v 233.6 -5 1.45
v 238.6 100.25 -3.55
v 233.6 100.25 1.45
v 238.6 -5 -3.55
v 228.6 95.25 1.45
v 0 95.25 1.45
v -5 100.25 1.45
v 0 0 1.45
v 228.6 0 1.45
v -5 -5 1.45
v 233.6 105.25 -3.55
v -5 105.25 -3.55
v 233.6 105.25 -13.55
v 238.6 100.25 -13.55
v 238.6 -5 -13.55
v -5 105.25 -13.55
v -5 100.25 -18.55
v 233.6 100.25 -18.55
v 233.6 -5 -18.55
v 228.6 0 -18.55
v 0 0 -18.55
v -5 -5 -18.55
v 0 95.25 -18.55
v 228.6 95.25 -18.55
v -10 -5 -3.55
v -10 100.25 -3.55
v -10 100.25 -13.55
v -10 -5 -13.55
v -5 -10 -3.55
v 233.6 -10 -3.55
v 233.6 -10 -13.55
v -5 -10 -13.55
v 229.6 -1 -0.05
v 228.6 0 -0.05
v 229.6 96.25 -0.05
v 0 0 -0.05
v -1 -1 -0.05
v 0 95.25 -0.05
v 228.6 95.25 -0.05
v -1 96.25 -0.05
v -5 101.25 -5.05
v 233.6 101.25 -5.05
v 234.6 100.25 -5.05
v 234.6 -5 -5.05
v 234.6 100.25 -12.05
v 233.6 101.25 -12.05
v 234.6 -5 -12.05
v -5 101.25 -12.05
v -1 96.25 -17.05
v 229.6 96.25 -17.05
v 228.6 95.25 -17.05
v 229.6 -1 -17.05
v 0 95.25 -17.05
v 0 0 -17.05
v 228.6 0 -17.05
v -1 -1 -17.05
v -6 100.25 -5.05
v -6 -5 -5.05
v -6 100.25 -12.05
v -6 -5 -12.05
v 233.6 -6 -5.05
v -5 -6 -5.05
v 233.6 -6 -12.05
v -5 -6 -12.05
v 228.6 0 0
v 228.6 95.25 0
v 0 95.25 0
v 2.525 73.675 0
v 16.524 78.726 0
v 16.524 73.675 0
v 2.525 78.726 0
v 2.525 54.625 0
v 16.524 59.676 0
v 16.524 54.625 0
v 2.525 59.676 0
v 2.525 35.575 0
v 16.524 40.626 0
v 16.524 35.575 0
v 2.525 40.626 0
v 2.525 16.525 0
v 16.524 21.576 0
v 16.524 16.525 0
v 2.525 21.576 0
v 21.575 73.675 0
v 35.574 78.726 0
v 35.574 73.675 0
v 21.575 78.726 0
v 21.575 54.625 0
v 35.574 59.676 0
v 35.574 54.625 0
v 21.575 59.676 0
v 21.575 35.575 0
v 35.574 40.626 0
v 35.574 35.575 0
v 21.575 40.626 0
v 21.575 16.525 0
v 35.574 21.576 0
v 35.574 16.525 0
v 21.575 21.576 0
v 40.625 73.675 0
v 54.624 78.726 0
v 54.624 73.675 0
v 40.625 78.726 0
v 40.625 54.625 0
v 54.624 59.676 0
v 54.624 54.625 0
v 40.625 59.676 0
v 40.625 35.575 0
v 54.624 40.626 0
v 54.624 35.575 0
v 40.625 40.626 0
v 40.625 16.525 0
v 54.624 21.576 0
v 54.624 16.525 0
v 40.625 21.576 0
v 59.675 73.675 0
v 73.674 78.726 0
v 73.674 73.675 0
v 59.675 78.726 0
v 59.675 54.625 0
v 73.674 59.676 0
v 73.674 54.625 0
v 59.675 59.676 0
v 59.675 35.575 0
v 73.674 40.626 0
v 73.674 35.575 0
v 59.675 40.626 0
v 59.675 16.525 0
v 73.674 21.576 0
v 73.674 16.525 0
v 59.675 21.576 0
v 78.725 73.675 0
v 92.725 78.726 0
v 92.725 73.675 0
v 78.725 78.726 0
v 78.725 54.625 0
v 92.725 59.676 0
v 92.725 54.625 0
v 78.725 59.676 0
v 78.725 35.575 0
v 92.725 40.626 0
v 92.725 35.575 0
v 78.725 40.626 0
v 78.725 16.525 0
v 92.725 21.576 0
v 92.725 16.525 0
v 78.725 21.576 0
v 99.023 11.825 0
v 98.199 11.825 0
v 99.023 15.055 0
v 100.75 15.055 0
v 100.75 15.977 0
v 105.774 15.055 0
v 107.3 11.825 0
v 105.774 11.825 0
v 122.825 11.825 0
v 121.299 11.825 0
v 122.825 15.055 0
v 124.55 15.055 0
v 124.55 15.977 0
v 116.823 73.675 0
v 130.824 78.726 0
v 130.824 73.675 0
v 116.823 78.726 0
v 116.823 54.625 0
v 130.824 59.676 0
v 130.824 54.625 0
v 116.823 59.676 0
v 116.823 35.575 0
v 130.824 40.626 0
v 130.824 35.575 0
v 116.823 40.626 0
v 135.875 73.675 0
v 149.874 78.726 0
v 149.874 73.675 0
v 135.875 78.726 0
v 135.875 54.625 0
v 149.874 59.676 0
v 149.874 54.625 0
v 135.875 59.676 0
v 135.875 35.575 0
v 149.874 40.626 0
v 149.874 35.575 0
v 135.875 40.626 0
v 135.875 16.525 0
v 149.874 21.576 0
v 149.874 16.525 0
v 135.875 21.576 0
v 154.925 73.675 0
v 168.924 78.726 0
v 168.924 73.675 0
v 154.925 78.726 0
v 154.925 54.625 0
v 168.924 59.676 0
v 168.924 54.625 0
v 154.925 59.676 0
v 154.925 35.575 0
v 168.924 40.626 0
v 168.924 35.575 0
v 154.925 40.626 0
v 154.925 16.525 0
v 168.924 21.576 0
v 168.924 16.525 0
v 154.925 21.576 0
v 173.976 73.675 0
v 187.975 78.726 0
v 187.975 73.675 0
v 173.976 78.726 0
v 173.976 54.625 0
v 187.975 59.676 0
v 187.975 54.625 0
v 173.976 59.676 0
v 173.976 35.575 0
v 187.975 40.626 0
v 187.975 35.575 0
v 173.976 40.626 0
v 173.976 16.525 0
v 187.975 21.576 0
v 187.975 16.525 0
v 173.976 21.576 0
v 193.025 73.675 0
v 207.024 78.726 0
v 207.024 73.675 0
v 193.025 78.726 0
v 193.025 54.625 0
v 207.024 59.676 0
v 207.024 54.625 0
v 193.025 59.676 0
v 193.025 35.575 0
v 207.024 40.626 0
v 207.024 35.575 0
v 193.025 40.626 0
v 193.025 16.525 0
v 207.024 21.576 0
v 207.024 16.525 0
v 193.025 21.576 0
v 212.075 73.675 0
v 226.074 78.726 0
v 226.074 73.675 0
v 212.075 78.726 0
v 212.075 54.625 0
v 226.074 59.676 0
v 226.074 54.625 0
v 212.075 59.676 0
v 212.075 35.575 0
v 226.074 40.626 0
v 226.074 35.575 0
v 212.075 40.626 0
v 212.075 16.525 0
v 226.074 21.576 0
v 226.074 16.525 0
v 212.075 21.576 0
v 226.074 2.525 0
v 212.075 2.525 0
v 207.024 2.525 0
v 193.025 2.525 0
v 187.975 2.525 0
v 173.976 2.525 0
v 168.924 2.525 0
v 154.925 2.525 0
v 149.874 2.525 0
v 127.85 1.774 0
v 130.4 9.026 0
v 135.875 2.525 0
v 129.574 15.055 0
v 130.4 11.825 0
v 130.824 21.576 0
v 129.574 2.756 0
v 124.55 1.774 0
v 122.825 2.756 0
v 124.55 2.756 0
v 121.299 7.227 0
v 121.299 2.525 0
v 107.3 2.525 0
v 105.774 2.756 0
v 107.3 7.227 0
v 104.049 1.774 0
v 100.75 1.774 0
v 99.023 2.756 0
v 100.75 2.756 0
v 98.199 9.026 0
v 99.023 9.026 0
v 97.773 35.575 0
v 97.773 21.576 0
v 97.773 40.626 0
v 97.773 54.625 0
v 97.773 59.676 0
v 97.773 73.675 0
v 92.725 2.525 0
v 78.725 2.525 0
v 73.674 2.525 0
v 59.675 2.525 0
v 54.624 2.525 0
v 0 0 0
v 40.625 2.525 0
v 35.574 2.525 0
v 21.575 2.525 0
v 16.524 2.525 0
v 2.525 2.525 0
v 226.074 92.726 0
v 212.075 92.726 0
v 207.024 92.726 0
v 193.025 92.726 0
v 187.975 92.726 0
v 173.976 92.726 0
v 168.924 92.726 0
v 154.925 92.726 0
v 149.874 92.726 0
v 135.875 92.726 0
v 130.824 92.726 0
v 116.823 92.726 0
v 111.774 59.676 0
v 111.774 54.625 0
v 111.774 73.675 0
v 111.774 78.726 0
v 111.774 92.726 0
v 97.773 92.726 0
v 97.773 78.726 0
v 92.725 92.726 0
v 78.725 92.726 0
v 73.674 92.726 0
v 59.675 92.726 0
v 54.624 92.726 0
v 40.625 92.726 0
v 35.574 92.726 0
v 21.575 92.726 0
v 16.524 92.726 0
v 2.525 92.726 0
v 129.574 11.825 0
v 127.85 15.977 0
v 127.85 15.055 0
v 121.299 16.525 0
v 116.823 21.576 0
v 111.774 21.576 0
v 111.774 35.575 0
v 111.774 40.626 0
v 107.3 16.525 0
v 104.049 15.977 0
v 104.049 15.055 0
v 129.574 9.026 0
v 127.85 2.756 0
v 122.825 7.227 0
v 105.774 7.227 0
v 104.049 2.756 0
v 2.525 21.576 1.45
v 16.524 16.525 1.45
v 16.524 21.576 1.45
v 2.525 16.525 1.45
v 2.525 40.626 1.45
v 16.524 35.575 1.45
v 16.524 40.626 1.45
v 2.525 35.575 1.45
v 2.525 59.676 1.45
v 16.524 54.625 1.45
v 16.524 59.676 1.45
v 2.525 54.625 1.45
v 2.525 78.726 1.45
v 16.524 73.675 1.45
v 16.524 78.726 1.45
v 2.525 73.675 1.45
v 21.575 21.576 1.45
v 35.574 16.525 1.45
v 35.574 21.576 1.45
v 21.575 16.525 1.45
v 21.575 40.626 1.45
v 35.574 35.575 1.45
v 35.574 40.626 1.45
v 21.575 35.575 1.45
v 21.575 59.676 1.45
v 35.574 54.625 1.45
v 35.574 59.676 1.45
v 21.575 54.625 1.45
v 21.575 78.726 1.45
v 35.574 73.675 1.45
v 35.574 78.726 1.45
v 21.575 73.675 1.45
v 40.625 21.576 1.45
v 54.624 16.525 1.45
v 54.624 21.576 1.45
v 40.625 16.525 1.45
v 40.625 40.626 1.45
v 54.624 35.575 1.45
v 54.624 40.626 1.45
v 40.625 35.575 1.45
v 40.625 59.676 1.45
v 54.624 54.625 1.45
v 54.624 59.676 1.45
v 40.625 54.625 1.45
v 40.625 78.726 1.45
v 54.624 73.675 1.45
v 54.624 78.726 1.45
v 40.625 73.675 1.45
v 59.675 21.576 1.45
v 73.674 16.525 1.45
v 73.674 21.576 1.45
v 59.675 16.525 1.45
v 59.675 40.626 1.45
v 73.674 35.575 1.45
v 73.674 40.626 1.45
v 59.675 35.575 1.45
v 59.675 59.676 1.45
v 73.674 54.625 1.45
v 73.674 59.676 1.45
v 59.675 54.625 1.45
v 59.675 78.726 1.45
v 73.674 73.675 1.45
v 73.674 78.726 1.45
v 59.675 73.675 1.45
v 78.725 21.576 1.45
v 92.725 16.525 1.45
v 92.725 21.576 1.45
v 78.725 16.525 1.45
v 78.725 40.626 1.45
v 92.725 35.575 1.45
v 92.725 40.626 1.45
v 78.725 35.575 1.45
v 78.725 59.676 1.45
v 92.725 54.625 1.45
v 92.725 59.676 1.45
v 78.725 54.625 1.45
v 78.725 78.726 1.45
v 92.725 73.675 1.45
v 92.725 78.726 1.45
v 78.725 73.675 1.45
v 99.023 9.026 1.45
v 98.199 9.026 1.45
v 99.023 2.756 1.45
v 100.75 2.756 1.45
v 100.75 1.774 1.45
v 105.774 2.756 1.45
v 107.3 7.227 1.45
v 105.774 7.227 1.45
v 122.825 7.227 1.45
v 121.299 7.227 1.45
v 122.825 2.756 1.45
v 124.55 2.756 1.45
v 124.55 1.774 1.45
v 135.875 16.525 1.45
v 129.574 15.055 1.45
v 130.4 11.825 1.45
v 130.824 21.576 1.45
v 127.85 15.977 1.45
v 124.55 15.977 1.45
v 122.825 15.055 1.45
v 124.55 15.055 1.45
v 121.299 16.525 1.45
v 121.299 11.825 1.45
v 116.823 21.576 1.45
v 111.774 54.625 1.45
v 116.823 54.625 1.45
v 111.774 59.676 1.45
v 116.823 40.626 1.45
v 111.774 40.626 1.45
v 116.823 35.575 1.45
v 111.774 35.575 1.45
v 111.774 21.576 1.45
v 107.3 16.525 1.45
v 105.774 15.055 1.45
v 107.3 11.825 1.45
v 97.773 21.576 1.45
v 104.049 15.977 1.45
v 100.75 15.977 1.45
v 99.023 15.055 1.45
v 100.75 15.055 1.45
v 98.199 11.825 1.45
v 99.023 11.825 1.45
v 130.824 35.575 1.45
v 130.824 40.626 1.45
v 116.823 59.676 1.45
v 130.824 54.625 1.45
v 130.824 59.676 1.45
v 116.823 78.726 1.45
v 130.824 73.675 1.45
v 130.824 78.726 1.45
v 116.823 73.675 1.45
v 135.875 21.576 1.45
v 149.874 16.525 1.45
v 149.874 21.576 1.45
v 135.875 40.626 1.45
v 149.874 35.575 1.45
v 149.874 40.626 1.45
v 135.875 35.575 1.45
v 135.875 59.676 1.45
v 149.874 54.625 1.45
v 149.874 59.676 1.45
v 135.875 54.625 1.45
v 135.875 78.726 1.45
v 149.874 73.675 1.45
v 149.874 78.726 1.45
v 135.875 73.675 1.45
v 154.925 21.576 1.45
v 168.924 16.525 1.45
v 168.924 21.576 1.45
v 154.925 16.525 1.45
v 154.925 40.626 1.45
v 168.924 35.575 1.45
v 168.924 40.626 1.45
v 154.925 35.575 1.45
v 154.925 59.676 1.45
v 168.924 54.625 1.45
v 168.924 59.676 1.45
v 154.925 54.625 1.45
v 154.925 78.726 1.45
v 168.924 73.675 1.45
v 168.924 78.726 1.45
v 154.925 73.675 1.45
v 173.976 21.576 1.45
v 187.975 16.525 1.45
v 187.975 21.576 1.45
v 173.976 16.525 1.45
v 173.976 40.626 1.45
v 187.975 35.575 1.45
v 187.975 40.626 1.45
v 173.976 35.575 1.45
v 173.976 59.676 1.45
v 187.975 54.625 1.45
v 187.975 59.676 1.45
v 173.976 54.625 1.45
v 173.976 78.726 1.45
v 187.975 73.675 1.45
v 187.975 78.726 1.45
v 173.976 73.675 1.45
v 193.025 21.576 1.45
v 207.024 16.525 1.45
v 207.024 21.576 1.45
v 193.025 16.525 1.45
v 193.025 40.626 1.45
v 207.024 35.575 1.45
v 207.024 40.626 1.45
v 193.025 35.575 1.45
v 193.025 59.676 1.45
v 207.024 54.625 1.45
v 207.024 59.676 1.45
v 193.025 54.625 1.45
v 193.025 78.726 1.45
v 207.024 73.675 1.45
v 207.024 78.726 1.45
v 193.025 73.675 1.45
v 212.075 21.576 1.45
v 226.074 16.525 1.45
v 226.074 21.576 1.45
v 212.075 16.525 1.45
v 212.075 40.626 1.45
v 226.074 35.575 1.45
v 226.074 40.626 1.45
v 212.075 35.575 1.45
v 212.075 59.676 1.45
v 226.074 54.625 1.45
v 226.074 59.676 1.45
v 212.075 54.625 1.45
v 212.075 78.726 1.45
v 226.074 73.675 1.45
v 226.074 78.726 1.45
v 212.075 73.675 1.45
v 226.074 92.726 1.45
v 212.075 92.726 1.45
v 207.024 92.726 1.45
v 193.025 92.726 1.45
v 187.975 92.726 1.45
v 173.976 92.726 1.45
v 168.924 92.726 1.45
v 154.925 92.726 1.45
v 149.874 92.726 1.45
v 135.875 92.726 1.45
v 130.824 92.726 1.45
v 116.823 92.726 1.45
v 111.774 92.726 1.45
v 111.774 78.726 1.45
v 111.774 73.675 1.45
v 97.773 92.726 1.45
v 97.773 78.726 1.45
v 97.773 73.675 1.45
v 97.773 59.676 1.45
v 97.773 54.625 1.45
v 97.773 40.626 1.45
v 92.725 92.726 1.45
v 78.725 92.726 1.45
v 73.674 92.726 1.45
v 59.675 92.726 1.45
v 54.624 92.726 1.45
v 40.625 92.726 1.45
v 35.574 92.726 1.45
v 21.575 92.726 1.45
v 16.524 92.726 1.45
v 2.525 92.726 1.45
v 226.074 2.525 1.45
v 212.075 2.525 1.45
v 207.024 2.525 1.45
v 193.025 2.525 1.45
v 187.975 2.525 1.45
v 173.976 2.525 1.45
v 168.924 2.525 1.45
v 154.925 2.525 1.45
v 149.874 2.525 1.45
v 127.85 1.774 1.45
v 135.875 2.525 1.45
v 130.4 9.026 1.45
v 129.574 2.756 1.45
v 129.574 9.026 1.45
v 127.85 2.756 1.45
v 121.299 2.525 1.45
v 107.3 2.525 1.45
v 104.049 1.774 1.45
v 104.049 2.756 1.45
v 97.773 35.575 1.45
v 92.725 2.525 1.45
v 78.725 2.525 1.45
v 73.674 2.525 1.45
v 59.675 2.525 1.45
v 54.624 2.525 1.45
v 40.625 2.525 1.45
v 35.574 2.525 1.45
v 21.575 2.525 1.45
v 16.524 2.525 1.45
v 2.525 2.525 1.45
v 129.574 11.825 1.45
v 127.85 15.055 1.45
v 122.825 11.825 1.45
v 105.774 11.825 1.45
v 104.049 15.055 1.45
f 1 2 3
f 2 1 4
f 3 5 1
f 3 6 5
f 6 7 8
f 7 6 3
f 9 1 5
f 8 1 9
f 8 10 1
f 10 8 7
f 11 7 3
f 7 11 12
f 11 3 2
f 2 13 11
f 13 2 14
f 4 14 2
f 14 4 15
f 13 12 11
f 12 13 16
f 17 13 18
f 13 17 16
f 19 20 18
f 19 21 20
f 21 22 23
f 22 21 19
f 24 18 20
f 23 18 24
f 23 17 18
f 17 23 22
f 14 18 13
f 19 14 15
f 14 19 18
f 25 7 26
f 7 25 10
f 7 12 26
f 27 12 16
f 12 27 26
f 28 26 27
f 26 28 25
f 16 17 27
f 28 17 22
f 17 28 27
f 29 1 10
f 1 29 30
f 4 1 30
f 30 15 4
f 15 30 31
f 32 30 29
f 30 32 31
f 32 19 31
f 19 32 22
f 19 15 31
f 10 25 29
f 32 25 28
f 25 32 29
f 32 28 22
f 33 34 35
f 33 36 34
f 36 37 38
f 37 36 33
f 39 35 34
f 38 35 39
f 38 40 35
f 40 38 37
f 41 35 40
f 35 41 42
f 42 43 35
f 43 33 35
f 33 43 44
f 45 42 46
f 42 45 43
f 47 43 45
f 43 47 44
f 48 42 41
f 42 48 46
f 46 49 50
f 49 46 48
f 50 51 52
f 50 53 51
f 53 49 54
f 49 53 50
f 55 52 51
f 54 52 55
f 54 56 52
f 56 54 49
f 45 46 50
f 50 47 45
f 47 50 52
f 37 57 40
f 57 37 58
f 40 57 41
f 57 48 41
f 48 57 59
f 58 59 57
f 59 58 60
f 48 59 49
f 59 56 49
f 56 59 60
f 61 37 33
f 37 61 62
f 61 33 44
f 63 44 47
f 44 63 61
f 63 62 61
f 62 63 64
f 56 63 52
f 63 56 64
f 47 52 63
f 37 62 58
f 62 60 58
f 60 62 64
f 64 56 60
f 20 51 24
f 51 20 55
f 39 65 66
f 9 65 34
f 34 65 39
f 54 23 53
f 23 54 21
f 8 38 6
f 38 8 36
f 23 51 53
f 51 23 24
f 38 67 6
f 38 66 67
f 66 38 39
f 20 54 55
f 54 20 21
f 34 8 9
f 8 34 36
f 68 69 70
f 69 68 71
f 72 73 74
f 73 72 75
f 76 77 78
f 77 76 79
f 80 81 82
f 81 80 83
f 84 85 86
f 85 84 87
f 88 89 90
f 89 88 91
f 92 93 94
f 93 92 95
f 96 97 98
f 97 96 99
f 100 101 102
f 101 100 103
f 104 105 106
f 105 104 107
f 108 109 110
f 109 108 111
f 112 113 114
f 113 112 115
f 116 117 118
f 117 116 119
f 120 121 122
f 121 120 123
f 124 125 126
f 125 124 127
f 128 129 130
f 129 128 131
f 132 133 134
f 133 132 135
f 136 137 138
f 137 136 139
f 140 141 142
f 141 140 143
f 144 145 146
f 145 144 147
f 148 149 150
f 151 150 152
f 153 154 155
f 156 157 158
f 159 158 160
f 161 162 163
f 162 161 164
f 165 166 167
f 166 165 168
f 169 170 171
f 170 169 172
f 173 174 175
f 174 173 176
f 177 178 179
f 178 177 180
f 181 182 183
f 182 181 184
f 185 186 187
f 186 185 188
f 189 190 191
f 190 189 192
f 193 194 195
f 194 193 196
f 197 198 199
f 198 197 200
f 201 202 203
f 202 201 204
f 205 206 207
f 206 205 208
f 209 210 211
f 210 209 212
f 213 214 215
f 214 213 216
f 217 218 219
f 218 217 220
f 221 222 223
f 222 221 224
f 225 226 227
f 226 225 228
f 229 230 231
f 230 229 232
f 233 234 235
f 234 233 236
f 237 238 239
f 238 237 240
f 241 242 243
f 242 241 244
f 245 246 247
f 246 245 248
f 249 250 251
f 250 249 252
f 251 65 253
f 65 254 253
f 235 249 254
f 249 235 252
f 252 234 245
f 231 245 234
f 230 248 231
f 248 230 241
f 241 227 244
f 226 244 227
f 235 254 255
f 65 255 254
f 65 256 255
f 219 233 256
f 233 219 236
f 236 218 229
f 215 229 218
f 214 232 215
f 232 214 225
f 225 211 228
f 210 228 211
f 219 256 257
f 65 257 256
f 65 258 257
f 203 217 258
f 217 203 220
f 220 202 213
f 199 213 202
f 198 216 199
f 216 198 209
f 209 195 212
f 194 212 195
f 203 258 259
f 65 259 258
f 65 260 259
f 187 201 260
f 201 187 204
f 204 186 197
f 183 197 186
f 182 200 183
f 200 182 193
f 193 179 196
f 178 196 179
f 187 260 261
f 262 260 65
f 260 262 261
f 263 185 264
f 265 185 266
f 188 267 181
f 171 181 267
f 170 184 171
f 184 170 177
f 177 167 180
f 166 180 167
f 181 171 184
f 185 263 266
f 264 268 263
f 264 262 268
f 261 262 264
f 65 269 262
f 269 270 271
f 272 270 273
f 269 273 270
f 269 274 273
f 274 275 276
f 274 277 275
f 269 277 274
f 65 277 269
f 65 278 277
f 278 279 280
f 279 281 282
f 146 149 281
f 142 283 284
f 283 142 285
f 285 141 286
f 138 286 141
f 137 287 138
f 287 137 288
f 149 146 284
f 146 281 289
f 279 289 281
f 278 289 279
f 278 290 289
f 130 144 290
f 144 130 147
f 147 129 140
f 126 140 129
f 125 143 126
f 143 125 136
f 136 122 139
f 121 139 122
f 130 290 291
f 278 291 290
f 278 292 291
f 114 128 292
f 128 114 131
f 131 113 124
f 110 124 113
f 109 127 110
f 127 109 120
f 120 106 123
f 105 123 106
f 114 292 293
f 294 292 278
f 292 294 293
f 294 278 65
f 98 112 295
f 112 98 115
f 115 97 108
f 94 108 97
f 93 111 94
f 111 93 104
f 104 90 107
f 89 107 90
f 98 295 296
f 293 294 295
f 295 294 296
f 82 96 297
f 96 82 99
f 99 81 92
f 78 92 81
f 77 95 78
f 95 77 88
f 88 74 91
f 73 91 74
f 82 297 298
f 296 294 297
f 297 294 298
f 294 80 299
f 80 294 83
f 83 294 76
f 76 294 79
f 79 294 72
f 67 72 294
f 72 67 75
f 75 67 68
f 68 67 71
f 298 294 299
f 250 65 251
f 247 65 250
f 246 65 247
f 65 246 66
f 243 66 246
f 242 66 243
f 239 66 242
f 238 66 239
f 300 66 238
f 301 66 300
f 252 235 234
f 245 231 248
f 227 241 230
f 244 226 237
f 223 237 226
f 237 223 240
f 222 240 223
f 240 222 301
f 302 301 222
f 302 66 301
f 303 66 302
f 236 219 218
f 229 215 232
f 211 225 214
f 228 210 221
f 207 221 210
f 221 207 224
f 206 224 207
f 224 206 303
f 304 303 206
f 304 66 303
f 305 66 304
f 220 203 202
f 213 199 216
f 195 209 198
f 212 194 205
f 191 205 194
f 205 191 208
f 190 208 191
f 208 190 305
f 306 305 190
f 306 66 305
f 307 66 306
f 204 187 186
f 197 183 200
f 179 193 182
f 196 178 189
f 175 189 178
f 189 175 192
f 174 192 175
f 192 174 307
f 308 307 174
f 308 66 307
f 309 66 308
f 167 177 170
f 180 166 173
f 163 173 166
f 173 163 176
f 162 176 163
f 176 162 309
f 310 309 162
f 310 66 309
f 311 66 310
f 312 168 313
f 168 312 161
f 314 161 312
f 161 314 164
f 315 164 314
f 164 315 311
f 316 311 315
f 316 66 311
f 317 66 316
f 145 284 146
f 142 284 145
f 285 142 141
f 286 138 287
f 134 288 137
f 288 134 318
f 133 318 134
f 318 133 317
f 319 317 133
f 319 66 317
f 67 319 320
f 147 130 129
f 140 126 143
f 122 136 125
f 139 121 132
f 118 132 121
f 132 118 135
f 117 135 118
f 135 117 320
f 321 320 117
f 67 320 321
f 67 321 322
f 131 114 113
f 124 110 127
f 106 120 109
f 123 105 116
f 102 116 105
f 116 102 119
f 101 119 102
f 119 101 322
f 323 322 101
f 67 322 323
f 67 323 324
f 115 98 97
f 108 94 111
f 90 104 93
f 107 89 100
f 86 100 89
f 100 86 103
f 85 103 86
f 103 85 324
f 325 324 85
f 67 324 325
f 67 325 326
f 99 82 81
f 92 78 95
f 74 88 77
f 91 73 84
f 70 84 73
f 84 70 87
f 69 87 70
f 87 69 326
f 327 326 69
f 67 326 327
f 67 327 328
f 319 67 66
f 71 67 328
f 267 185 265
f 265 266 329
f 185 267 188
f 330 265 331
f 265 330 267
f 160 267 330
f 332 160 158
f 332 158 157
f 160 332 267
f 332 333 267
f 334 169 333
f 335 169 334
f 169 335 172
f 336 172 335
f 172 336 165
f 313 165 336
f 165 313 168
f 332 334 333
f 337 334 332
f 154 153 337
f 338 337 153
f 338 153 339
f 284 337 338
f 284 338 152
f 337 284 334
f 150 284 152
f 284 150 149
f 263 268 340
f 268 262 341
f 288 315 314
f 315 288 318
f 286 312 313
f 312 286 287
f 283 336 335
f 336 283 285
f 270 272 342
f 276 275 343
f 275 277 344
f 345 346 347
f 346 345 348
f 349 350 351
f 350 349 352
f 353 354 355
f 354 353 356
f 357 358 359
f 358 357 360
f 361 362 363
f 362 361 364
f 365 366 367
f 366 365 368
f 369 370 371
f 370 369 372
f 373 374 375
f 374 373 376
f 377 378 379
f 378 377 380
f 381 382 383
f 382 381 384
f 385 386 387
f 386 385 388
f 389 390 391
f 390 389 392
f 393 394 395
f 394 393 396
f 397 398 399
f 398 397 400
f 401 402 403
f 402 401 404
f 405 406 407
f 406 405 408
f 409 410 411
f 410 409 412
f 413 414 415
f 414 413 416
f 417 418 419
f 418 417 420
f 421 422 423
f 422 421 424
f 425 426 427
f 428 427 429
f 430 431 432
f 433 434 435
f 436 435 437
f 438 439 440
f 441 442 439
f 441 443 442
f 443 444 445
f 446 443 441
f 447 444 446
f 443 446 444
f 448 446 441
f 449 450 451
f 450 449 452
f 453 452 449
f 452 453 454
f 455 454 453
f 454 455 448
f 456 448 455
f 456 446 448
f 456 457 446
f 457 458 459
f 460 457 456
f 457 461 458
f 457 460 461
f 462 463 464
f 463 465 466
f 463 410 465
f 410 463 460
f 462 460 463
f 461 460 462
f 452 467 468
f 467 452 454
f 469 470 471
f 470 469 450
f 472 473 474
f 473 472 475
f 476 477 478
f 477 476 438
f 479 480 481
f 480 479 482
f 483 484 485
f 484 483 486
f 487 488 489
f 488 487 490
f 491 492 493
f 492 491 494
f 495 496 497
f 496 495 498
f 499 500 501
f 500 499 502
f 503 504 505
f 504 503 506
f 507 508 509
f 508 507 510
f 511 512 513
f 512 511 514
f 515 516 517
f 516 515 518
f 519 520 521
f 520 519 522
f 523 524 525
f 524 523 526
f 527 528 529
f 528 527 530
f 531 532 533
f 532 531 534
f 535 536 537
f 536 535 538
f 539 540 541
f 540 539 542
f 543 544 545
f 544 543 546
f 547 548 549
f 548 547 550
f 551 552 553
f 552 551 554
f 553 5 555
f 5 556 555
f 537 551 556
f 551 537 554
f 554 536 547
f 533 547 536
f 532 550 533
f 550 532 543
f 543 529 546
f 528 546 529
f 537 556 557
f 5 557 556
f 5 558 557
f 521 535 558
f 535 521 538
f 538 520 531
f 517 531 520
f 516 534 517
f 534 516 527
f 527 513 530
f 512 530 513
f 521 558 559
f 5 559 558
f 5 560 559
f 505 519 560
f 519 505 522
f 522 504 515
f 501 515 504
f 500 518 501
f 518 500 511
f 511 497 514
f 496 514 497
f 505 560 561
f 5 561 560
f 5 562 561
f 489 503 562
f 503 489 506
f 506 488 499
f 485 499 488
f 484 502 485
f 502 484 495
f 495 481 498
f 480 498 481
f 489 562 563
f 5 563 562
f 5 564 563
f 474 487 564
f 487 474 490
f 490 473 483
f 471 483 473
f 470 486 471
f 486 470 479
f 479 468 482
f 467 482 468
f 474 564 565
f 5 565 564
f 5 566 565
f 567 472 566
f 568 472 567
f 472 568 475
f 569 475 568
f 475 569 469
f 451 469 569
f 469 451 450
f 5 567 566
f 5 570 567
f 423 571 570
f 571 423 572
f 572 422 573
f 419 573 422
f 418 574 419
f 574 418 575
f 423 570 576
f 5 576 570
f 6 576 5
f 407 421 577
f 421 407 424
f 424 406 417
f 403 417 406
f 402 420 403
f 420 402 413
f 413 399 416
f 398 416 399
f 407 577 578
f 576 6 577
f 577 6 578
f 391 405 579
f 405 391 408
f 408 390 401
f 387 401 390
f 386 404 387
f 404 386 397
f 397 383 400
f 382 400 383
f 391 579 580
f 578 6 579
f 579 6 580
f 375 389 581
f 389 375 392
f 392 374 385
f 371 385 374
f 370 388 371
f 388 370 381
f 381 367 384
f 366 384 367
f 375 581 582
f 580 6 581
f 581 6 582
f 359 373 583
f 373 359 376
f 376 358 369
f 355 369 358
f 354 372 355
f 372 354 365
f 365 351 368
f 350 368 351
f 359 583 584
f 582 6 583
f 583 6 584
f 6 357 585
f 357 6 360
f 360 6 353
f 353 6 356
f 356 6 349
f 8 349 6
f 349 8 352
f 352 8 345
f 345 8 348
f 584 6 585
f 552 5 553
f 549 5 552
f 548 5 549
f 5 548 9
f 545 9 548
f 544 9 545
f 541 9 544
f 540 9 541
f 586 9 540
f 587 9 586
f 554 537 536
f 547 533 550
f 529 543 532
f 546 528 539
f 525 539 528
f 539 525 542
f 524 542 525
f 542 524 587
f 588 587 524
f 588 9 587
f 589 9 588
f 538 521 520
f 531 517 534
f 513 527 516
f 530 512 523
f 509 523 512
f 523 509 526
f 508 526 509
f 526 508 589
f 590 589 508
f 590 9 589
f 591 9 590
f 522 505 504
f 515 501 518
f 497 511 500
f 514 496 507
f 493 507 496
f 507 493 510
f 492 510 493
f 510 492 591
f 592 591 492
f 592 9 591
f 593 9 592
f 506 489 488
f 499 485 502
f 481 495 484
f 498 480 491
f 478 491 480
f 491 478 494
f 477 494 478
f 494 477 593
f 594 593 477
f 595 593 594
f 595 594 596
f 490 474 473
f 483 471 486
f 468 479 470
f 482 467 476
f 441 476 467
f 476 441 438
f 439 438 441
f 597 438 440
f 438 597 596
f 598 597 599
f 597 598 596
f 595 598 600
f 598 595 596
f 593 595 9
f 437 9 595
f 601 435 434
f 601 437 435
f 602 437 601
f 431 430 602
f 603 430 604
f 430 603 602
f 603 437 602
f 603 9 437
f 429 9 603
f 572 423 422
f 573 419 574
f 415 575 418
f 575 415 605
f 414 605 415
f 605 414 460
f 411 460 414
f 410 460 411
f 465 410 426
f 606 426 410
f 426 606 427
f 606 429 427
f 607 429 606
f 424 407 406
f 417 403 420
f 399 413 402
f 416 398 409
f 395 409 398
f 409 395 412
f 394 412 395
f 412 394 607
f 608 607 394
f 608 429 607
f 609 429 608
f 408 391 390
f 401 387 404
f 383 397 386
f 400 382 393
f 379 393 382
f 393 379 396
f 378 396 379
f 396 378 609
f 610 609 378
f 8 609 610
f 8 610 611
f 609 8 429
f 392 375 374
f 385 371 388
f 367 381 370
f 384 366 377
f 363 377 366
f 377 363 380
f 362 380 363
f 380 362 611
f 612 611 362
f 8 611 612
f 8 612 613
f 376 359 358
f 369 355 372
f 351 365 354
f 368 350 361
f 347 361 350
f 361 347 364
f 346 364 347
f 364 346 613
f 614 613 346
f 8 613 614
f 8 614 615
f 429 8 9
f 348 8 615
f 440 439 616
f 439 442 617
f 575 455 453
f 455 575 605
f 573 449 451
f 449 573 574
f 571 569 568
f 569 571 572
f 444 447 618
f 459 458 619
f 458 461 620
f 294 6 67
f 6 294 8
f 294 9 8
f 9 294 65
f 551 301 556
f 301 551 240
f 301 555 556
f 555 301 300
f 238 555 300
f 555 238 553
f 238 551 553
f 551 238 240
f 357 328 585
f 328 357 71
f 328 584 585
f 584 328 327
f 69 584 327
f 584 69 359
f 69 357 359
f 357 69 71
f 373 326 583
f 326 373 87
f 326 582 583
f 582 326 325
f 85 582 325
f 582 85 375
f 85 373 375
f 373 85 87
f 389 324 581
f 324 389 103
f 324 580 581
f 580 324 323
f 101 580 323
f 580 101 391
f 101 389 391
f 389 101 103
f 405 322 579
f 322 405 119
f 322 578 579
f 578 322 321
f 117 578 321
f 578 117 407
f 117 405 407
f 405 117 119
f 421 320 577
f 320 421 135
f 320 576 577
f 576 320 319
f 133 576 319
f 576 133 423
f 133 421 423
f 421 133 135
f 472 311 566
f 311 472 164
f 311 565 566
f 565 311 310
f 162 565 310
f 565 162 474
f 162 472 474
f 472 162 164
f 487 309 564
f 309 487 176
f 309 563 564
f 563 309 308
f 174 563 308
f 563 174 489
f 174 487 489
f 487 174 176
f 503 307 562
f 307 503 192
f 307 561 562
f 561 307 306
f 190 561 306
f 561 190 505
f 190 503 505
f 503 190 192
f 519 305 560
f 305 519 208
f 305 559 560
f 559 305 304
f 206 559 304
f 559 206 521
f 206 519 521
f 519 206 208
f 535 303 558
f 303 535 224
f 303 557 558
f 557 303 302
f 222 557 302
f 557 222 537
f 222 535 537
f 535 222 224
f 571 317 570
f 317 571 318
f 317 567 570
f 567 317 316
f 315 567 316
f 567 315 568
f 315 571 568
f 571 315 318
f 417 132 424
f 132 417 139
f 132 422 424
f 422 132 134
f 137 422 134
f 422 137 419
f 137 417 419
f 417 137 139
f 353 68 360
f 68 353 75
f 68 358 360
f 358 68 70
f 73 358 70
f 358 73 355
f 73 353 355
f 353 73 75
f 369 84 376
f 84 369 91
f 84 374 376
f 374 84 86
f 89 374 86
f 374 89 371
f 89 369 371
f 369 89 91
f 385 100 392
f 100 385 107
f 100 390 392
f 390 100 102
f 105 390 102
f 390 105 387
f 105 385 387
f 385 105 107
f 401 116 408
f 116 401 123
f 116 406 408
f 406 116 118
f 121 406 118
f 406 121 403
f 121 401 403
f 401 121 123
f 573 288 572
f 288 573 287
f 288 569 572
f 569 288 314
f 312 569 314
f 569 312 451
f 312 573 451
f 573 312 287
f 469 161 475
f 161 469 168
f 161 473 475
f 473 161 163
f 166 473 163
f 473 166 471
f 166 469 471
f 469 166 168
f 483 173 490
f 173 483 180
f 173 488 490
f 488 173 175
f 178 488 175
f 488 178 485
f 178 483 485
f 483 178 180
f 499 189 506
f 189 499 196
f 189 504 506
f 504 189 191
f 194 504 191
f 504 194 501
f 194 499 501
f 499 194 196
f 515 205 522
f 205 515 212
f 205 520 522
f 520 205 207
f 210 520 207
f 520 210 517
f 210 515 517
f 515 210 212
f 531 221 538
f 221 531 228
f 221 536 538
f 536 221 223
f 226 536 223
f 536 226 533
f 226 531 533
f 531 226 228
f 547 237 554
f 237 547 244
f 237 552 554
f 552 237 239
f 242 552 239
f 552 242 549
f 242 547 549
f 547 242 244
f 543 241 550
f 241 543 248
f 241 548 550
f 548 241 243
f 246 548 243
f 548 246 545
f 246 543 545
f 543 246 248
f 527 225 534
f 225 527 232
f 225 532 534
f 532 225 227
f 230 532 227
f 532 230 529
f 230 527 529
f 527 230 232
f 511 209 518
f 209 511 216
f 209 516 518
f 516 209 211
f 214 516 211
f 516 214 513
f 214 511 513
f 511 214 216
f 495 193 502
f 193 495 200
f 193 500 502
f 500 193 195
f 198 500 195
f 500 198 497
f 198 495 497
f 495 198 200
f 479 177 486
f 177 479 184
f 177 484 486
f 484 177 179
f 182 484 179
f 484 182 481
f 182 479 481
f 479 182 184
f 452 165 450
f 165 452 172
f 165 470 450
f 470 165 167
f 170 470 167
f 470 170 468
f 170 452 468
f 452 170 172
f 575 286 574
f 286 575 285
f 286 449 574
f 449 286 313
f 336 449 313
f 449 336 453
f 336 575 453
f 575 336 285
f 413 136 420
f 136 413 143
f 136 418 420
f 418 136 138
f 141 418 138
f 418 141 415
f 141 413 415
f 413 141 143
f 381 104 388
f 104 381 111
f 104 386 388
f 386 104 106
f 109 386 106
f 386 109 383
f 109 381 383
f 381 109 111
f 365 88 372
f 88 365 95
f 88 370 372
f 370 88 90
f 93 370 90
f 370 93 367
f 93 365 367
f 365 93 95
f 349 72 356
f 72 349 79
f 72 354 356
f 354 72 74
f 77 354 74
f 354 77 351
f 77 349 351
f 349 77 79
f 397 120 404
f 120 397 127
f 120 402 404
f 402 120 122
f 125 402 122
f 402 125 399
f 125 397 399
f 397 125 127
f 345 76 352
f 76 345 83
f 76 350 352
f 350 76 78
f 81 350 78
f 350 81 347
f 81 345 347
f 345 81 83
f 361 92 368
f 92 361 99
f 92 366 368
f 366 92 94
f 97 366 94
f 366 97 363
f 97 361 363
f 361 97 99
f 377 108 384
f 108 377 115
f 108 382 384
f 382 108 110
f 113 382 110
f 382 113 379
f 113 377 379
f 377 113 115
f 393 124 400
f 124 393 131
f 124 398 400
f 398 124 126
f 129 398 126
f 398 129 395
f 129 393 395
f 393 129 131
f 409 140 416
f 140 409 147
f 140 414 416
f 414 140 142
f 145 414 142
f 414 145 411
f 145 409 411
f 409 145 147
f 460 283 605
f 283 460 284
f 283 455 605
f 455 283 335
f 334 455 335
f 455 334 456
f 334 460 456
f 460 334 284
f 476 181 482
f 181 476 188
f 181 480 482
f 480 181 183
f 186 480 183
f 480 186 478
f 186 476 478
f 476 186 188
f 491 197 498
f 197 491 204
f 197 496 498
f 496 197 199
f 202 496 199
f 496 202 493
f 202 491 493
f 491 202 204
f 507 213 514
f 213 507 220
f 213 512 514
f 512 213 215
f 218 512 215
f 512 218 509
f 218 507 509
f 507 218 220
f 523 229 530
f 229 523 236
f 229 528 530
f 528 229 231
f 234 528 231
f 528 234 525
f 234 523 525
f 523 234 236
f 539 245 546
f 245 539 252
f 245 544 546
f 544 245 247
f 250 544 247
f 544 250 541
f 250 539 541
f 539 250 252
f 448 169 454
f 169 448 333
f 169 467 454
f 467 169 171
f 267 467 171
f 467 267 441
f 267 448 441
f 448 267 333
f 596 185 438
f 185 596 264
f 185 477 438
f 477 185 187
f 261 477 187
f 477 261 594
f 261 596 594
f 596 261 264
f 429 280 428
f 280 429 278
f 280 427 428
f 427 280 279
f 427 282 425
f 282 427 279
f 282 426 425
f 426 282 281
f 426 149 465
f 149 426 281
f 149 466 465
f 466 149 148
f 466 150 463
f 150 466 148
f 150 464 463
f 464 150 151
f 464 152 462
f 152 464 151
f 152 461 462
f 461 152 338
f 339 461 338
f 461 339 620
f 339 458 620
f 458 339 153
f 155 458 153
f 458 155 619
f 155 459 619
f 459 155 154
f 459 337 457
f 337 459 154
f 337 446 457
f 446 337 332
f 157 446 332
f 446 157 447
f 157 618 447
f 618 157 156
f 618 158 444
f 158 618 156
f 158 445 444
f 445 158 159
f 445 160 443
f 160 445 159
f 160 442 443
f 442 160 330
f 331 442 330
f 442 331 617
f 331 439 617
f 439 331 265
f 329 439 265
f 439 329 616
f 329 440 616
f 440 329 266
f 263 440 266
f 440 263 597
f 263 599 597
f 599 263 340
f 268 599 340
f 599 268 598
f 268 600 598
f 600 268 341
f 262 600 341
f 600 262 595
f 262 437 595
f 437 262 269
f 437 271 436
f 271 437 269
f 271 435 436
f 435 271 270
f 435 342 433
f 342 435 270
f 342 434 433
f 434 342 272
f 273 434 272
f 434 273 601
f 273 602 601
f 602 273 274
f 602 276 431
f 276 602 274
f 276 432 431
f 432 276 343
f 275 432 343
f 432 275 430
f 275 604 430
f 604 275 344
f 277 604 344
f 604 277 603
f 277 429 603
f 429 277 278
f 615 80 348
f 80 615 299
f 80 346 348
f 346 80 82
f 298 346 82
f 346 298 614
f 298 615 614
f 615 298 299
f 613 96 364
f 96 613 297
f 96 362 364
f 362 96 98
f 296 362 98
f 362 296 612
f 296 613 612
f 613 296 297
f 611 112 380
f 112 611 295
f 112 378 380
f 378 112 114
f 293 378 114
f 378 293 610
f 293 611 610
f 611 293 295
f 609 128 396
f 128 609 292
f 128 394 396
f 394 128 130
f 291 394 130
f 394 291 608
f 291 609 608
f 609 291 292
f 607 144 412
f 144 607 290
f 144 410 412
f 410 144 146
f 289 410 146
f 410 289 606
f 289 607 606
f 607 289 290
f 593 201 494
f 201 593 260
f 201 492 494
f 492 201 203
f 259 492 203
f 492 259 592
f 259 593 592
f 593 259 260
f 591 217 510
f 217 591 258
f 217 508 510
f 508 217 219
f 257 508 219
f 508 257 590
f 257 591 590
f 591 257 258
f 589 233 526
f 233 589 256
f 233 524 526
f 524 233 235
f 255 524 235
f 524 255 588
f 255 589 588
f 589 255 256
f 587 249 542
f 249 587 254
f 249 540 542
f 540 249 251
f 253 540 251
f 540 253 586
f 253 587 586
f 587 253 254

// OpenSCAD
// file: scad/beveled_cube.scad
// Beveled cube
//
// dim: dimensions of the cube
// bevel_top: 2d array width the dimensions of the bevel used
//   at the top of the cube. The first element specifies the 
//   amount the bevel goed towards the z-axis. The second
//   element the height of the bevel.
// bevel_size: single value with the dimension of the side 
//   bevel
// bevel_bottom: 2d array for the bottom bevel. See 
//   bevel_top. 
//
// The cube is centered at the origin for the x and y axis and 
// the bottom of the cube is positioned at z=0. 
// 
// Example:
// dim = [200, 100, 20];
// bevel_top  = [10, 3];
// bevel_side  = 8;
// bevel_bottom  = [4, 4];
// beveled_cube(dim, bevel_top, bevel_side, bevel_bottom);
//
module beveled_cube(dim, bevel_top, bevel_side, bevel_bottom) {
  d = [dim[0]*0.5, dim[1]*0.5, dim[2]];
  beveled_cube_q(d, bevel_top, bevel_side, bevel_bottom);
  mirror([1, 0, 0])
    beveled_cube_q(d, bevel_top, bevel_side, bevel_bottom);
  mirror([0, 1, 0])
    beveled_cube_q(d, bevel_top, bevel_side, bevel_bottom);
  mirror([1, 0, 0]) mirror([0, 1, 0])
    beveled_cube_q(d, bevel_top, bevel_side, bevel_bottom);
}

// Utility function for beveled_cube
module beveled_cube_q(dim, bt, bs, bb) {
  // top
  translate([0, 0, dim[2]-bt[1]])
    bevels([dim[0], dim[1], bt[1]], bt[0], bs);
  // middle
  translate([0, 0, bb[1]])
    bevels([dim[0], dim[1], dim[2]-bt[1]-bb[1]], 0, bs);
  //bottom
  translate([0, 0, bb[1]])
    mirror([0, 0, 1])
    bevels([dim[0], dim[1], bb[1]], bb[0], bs);
}

// Utility function for beveled_cube
module bevels(dim, bt, bs) {
  polyhedron(
    points = [
      [0, 0, 0], // 0
      [dim[0], 0, 0], // 1
      [dim[0]-bt, 0, dim[2]], // 2
      [0, 0, dim[2]],  // 3
      [dim[0], dim[1]-bs, 0], //4 
      [dim[0]-bt, min(dim[1]-bt, dim[1]-bs), dim[2]], //5
      [0, dim[1], 0],  // 6
      [dim[0]-bs, dim[1], 0], //7 
      [min(dim[0]-bt, dim[0]-bs), dim[1]-bt, dim[2]], //8
      [0, dim[1]-bt, dim[2]] //9
    ],
    faces = [
      [3, 9, 8, 5, 2], //top
      [0, 3, 2, 1], //front
      [0, 6, 9, 3], //left 
      [6, 7, 8, 9], // back
      [7, 4, 5, 8], // back-side-bevel
      [1, 2, 5, 4], // right side
      [0, 1, 4, 7, 6] // bottom
    ]
  );
}
// main file
$fn=100;

grid = 19.05;

cross_height = 5+3.3-1.5+1;
cross_width = 1.5;
raster_height = 5-1.5;
nwidth = 12;
nlength = 5;
wall = 2;
rwall = 4;
hwall = 5+3.3+1.5+6;
width = grid*nwidth;
length = grid*nlength;

use<scad/beveled_cube.scad>


// how far does switch stick out at the back of the plate:
// https://switches-sensors.zf.com/wp-content/uploads/2012/07/Keymodule_MX_EN.pdf
// 5 mm thickness swith
// 3.3 mm length pins
// -1.5 thickness plate
// 5 + 3.3 - 1.5

color("red")
linear_extrude(1.45)
  translate([-0.0947, -0.2578])
  import("plate_base.dxf", convexity = 10);
  
 
translate([(width)/2, length/2, -20+1.45])
difference() {
  beveled_cube([width+20, length+20,20], [5,5], 5, [5,5]);
  translate([-width/2, -length/2, -1])
    cube([width, length, 20+2]);  
  translate([0, 0, 1.5])
    beveled_cube([width+20-8, length+20-8,20-3], [5,5], 1, [5,5]);  
}



echo(width+20, length+20);
